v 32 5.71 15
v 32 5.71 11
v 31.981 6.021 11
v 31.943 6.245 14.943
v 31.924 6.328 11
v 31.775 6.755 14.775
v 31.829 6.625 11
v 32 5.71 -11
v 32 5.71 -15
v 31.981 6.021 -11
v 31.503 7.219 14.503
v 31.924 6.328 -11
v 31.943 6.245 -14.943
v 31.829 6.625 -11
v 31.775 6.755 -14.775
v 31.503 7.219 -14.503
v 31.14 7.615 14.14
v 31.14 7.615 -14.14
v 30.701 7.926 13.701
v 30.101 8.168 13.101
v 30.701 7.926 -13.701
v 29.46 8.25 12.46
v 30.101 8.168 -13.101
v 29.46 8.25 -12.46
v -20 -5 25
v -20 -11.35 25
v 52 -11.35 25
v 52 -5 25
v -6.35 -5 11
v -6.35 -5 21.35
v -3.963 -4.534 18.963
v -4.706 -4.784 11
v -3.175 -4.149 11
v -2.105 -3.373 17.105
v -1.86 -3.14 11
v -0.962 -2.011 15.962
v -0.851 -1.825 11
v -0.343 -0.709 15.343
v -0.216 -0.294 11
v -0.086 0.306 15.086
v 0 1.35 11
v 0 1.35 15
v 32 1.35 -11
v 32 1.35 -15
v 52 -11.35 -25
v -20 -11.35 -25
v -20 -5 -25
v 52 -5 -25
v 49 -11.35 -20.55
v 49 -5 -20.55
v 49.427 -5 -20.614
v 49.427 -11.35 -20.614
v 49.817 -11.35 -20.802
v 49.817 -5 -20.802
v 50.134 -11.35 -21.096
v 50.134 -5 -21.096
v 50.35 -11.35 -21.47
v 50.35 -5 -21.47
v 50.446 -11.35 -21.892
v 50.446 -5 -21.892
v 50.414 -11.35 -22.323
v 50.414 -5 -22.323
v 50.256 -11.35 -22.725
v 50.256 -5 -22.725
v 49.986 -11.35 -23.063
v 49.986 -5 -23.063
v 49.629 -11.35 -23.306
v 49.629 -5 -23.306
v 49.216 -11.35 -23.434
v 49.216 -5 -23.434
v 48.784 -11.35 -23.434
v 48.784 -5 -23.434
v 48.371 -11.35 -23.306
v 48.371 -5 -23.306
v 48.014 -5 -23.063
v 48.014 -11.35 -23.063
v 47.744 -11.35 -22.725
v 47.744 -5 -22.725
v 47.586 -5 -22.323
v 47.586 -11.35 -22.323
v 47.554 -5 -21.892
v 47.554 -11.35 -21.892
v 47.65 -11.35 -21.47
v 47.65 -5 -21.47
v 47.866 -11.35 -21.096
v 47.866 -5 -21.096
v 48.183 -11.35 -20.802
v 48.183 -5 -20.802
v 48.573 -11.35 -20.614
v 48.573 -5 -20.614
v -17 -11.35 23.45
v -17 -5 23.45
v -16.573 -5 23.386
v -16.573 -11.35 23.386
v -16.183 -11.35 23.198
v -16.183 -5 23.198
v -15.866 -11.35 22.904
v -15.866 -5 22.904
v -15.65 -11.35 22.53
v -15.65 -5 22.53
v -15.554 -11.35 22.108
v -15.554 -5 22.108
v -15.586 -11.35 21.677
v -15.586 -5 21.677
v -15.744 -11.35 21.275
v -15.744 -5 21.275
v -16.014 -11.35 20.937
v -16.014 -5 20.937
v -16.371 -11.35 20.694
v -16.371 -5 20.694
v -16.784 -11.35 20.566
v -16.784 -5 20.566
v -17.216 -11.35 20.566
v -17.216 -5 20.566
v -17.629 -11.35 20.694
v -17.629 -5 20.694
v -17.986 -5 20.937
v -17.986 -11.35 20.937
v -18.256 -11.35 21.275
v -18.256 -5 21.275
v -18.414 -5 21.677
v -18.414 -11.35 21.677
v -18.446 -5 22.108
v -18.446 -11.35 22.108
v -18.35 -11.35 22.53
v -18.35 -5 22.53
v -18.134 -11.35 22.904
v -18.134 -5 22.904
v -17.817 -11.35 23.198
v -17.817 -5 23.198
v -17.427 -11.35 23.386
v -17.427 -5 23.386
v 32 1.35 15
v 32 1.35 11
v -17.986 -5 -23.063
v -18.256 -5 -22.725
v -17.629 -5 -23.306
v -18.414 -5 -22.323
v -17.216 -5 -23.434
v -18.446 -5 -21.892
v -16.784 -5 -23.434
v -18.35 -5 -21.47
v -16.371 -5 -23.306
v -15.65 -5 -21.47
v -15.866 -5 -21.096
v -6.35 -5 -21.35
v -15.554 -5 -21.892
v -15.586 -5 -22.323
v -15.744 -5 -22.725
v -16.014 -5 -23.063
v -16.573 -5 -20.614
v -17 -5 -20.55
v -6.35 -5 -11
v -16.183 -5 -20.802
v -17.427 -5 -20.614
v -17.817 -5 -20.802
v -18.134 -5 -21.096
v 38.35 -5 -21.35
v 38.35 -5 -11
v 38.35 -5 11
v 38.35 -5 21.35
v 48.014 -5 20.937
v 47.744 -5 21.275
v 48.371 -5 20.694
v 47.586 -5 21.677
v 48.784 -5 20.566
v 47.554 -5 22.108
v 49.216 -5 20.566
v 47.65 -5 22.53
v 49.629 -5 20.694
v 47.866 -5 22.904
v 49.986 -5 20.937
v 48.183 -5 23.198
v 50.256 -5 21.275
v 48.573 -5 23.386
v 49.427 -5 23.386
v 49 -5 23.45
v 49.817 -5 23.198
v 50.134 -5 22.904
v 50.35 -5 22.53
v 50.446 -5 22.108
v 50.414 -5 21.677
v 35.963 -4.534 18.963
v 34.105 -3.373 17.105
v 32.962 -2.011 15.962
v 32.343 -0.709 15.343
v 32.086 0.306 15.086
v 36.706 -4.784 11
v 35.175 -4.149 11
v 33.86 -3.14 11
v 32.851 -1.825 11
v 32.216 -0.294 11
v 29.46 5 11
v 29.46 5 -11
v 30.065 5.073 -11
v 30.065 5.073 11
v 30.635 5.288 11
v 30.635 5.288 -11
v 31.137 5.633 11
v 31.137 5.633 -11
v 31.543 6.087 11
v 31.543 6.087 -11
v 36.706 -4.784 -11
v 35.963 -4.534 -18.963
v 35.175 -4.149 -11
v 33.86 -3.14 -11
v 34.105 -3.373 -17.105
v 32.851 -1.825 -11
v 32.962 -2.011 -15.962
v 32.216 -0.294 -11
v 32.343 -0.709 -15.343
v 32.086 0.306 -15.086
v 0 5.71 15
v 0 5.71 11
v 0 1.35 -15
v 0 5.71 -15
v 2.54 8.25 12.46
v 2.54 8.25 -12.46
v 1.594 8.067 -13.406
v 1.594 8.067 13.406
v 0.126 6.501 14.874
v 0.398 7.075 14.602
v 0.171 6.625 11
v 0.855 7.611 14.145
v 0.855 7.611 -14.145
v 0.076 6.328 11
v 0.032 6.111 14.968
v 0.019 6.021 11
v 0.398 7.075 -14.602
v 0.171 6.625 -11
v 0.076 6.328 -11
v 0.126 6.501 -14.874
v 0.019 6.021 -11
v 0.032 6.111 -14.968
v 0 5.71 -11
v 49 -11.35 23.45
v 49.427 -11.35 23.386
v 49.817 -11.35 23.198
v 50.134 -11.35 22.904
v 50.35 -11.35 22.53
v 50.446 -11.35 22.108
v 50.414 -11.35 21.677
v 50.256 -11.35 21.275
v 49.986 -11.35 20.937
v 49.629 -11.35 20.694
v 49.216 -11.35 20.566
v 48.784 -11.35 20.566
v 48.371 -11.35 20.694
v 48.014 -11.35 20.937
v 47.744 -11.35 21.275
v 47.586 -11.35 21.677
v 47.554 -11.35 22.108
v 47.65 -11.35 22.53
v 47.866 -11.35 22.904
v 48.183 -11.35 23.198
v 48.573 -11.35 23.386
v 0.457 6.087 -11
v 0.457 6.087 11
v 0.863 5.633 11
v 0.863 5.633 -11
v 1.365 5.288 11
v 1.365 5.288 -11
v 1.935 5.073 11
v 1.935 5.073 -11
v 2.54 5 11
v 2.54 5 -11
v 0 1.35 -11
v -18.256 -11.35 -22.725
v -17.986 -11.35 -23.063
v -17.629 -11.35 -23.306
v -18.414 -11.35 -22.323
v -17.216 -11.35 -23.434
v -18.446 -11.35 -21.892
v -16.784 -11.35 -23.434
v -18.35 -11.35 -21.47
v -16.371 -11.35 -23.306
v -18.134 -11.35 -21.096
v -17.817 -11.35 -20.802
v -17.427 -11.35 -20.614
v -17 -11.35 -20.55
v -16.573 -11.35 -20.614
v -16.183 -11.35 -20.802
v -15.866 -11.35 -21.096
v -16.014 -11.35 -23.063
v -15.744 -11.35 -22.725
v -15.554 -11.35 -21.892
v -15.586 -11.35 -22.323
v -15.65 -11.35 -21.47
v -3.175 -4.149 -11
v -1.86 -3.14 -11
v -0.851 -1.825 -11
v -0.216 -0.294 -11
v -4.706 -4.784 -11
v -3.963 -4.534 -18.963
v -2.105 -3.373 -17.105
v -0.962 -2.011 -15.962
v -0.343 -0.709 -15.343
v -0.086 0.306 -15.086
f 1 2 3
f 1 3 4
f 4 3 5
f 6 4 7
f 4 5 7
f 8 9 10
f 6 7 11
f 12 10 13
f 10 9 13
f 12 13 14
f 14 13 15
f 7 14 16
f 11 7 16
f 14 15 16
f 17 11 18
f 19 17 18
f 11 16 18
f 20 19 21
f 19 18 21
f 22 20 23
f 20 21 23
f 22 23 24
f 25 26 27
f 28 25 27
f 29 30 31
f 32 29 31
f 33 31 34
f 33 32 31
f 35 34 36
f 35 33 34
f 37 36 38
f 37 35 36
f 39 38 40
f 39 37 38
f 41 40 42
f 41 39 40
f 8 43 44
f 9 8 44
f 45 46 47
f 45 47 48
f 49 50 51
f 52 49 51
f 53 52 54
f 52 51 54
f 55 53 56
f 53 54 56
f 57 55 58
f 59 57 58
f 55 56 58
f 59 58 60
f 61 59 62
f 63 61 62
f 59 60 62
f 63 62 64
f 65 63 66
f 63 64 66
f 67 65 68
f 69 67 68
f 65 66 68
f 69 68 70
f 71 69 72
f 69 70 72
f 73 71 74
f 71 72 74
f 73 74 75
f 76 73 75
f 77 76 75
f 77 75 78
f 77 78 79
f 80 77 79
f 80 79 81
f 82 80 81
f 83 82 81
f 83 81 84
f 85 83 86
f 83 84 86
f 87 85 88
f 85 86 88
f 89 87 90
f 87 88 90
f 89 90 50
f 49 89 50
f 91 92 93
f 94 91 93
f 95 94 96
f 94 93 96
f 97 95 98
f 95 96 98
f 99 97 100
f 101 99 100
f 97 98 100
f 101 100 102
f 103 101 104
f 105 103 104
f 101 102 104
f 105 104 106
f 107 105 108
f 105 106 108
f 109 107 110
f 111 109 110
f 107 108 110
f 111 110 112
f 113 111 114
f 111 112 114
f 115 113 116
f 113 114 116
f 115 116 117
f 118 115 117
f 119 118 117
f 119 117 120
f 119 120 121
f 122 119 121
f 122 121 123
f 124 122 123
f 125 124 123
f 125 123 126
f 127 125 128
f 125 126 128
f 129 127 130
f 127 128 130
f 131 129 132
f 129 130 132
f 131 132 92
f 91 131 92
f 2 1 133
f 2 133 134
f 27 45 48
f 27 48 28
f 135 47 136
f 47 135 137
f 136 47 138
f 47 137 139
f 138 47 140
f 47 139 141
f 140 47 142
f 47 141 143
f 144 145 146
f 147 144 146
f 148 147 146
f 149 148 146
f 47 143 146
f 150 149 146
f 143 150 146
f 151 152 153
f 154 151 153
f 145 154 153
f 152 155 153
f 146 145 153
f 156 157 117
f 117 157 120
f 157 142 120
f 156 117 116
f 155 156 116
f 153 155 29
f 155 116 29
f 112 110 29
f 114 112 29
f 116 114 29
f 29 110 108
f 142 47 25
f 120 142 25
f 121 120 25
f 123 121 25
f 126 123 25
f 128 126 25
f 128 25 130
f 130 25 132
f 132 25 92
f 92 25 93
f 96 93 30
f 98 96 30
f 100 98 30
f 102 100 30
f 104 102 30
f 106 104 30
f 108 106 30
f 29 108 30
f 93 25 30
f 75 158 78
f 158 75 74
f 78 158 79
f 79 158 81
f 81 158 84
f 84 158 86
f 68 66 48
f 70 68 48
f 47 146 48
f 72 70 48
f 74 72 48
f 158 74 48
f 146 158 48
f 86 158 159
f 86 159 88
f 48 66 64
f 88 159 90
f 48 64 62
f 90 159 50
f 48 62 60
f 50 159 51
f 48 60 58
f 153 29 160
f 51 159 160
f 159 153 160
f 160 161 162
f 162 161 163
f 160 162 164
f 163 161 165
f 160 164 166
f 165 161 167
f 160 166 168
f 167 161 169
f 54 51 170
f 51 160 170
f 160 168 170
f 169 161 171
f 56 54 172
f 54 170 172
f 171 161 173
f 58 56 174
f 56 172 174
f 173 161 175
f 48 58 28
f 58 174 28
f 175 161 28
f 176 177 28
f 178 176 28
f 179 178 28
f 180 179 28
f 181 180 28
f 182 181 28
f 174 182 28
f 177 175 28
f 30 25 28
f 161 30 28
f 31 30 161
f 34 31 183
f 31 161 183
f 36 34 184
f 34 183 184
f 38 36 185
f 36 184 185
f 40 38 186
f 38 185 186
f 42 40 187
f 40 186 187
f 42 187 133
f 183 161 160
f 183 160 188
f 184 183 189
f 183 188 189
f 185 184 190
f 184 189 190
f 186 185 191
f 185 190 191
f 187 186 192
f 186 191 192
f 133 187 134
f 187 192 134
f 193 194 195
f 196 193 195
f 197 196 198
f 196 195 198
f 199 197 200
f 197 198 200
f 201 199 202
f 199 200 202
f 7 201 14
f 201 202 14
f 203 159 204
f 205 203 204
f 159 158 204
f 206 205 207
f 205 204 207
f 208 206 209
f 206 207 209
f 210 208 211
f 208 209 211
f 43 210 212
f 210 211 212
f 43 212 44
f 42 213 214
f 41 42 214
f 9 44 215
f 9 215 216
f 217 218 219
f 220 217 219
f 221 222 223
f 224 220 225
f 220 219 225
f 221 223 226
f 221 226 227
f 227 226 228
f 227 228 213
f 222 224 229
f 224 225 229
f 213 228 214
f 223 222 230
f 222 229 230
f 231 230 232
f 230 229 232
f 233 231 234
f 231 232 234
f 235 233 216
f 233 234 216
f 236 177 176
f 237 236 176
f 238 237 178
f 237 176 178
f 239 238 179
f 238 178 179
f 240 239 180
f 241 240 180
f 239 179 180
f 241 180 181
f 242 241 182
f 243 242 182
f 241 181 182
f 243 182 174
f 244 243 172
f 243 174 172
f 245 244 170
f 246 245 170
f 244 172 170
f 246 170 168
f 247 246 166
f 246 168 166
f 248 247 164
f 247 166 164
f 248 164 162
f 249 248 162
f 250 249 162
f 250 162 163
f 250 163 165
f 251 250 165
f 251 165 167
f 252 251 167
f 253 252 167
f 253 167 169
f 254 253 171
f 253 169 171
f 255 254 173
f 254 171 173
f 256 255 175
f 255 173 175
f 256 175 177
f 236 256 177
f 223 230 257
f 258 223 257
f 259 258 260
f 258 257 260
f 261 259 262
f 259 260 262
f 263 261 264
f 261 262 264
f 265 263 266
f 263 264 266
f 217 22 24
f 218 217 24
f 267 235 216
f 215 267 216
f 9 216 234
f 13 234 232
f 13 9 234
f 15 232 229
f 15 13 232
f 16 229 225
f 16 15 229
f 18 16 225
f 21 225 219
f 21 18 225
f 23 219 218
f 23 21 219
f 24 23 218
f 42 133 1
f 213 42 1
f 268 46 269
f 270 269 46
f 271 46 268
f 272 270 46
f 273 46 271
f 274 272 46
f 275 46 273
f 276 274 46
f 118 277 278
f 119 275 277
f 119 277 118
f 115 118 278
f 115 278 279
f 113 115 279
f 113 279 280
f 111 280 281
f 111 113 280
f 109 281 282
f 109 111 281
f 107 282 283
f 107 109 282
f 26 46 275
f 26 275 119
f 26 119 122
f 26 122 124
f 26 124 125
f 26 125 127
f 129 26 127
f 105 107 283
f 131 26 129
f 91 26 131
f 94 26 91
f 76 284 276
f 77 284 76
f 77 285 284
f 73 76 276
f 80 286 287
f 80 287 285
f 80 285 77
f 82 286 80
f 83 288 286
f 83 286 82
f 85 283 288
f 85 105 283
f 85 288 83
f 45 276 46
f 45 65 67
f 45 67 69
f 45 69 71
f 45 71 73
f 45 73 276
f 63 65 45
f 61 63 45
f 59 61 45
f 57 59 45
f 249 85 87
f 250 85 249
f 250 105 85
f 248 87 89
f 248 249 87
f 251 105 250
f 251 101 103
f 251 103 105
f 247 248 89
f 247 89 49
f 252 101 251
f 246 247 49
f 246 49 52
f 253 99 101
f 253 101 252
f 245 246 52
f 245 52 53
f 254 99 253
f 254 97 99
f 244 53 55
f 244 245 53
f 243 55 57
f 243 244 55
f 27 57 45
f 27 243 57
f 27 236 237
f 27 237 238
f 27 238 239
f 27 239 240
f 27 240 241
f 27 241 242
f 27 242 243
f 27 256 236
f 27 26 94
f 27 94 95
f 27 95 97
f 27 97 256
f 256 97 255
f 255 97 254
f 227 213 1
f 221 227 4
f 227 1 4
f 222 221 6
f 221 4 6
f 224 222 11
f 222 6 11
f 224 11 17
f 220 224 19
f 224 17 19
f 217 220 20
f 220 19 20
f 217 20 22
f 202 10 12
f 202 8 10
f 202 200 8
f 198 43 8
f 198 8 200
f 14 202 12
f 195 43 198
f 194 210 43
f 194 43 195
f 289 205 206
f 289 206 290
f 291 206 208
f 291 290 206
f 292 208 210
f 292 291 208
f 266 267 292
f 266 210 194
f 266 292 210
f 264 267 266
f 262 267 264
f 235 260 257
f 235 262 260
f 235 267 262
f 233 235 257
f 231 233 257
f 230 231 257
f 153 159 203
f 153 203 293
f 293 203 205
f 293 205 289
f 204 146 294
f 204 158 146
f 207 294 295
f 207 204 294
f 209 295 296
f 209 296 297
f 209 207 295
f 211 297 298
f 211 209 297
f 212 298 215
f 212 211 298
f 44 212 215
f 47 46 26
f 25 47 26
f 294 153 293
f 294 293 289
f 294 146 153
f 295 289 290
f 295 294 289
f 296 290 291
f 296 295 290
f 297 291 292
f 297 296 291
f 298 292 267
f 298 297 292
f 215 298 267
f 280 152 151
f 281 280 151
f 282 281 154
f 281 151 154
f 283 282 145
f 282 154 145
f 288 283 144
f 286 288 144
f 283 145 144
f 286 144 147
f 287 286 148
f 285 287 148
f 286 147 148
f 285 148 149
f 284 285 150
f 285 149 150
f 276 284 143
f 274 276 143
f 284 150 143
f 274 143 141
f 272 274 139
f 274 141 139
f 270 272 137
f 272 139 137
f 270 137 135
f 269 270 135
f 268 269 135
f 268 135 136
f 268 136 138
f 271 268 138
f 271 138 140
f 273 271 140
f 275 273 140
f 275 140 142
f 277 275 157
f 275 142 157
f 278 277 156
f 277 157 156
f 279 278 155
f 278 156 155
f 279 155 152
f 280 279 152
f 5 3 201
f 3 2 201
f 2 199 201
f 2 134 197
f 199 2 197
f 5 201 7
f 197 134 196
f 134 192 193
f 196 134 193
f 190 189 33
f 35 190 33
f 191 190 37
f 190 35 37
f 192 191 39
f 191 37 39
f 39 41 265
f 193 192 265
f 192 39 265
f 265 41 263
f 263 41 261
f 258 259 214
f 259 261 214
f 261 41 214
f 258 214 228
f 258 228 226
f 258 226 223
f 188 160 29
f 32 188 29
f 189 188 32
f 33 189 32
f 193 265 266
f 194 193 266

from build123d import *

# Parameters (mm, degrees)
SKETCH2_W            = 30
SKETCH2_H            = 19.6
SKETCH2_W_2          = 22
SKETCH2_H_2          = 10
BOSS_EXTRUDE2_DEPTH  = 32
SKETCH3_W            = 72
SKETCH3_H            = 50
BOSS_EXTRUDE3_DEPTH  = 6.35
SKETCH4_R            = 1.45
CUT_EXTRUDE1_DEPTH   = 6.35
LPATTERN1_COUNT      = 2
LPATTERN1_PITCH      = 66.000000014
LPATTERN1_COUNT_DIR2 = 2
LPATTERN1_PITCH_DIR2 = 44.000000072
FILLET1_R            = 6.35
FILLET2_R            = 2.54
FILLET3_R            = 2.54


with BuildPart() as part:
    # Sketch2 → Boss-Extrude2 (new body)
    with BuildSketch(Plane(origin=(0, 0, 0), x_dir=(0, 0, -1), z_dir=(1, 0, 0))):
        with Locations((0, -1.55)):
            Rectangle(SKETCH2_W, SKETCH2_H)
        Rectangle(SKETCH2_W_2, SKETCH2_H_2, mode=Mode.SUBTRACT)
    extrude(amount=BOSS_EXTRUDE2_DEPTH)

    # Sketch3 → Boss-Extrude3 (add)
    with BuildSketch(Plane.XZ.offset(11.35)):
        with Locations((16, 0)):
            Rectangle(SKETCH3_W, SKETCH3_H)
    extrude(amount=-BOSS_EXTRUDE3_DEPTH)

    # Sketch4 → Cut-Extrude1 (cut)
    with BuildSketch(Plane(origin=(0, -5, 0), x_dir=(1, 0, 0), z_dir=(0, 1, 0))):
        with Locations(Location((-17, -22.000006, 0), (0, 0, 270))):
            Circle(SKETCH4_R)
    cut_extrude1 = extrude(amount=-CUT_EXTRUDE1_DEPTH, mode=Mode.SUBTRACT)

    # LPattern1: Cut-Extrude1 2 × 2
    with Locations(*[(i * LPATTERN1_PITCH, 0, -j * LPATTERN1_PITCH_DIR2) for i in range(LPATTERN1_COUNT) for j in range(LPATTERN1_COUNT_DIR2) if (i, j) != (0, 0)]):
        add(cut_extrude1, mode=Mode.SUBTRACT)

    # Fillet1
    fillet1_edges = [part.edges().sort_by_distance(p)[0] for p in [
        (0, -5, 13),
        (0, -5, -13),
        (16, -5, 15),
        (32, -5, 13),
        (32, -5, -13),
        (16, -5, -15),
    ]]
    fillet(fillet1_edges, radius=FILLET1_R)

    # Fillet2
    fillet2_edges = [part.edges().sort_by_distance(p)[0] for p in [
        (0, 8.25, 0),
        (16, 8.25, 15),
        (16, 8.25, -15),
        (32, 8.25, 0),
    ]]
    fillet(fillet2_edges, radius=FILLET2_R)

    # Fillet3
    # the kernel refuses this fillet: 2.54 mm, written as the material it takes off along each edge
    with BuildSketch(Plane(origin=(0, 5, -11), x_dir=(0, 1, 0), z_dir=(0, 0, 1))) as fillet3_piece_1:
        with BuildLine():
            CenterArc((FILLET3_R, -FILLET3_R), FILLET3_R, 90, 90)
            Line((0, -FILLET3_R), (0, 0))
            Line((0, 0), (FILLET3_R, 0))
        make_face()
    extrude(amount=22, mode=Mode.SUBTRACT)
    with BuildSketch(Plane(origin=(32, 5, -11), x_dir=(0, 1, 0), z_dir=(0, 0, 1))) as fillet3_piece_2:
        with BuildLine():
            CenterArc((FILLET3_R, FILLET3_R), FILLET3_R, 180, 90)
            Line((0, FILLET3_R), (0, 0))
            Line((0, 0), (FILLET3_R, 0))
        make_face()
    extrude(amount=22, mode=Mode.SUBTRACT)


solid = part.part
